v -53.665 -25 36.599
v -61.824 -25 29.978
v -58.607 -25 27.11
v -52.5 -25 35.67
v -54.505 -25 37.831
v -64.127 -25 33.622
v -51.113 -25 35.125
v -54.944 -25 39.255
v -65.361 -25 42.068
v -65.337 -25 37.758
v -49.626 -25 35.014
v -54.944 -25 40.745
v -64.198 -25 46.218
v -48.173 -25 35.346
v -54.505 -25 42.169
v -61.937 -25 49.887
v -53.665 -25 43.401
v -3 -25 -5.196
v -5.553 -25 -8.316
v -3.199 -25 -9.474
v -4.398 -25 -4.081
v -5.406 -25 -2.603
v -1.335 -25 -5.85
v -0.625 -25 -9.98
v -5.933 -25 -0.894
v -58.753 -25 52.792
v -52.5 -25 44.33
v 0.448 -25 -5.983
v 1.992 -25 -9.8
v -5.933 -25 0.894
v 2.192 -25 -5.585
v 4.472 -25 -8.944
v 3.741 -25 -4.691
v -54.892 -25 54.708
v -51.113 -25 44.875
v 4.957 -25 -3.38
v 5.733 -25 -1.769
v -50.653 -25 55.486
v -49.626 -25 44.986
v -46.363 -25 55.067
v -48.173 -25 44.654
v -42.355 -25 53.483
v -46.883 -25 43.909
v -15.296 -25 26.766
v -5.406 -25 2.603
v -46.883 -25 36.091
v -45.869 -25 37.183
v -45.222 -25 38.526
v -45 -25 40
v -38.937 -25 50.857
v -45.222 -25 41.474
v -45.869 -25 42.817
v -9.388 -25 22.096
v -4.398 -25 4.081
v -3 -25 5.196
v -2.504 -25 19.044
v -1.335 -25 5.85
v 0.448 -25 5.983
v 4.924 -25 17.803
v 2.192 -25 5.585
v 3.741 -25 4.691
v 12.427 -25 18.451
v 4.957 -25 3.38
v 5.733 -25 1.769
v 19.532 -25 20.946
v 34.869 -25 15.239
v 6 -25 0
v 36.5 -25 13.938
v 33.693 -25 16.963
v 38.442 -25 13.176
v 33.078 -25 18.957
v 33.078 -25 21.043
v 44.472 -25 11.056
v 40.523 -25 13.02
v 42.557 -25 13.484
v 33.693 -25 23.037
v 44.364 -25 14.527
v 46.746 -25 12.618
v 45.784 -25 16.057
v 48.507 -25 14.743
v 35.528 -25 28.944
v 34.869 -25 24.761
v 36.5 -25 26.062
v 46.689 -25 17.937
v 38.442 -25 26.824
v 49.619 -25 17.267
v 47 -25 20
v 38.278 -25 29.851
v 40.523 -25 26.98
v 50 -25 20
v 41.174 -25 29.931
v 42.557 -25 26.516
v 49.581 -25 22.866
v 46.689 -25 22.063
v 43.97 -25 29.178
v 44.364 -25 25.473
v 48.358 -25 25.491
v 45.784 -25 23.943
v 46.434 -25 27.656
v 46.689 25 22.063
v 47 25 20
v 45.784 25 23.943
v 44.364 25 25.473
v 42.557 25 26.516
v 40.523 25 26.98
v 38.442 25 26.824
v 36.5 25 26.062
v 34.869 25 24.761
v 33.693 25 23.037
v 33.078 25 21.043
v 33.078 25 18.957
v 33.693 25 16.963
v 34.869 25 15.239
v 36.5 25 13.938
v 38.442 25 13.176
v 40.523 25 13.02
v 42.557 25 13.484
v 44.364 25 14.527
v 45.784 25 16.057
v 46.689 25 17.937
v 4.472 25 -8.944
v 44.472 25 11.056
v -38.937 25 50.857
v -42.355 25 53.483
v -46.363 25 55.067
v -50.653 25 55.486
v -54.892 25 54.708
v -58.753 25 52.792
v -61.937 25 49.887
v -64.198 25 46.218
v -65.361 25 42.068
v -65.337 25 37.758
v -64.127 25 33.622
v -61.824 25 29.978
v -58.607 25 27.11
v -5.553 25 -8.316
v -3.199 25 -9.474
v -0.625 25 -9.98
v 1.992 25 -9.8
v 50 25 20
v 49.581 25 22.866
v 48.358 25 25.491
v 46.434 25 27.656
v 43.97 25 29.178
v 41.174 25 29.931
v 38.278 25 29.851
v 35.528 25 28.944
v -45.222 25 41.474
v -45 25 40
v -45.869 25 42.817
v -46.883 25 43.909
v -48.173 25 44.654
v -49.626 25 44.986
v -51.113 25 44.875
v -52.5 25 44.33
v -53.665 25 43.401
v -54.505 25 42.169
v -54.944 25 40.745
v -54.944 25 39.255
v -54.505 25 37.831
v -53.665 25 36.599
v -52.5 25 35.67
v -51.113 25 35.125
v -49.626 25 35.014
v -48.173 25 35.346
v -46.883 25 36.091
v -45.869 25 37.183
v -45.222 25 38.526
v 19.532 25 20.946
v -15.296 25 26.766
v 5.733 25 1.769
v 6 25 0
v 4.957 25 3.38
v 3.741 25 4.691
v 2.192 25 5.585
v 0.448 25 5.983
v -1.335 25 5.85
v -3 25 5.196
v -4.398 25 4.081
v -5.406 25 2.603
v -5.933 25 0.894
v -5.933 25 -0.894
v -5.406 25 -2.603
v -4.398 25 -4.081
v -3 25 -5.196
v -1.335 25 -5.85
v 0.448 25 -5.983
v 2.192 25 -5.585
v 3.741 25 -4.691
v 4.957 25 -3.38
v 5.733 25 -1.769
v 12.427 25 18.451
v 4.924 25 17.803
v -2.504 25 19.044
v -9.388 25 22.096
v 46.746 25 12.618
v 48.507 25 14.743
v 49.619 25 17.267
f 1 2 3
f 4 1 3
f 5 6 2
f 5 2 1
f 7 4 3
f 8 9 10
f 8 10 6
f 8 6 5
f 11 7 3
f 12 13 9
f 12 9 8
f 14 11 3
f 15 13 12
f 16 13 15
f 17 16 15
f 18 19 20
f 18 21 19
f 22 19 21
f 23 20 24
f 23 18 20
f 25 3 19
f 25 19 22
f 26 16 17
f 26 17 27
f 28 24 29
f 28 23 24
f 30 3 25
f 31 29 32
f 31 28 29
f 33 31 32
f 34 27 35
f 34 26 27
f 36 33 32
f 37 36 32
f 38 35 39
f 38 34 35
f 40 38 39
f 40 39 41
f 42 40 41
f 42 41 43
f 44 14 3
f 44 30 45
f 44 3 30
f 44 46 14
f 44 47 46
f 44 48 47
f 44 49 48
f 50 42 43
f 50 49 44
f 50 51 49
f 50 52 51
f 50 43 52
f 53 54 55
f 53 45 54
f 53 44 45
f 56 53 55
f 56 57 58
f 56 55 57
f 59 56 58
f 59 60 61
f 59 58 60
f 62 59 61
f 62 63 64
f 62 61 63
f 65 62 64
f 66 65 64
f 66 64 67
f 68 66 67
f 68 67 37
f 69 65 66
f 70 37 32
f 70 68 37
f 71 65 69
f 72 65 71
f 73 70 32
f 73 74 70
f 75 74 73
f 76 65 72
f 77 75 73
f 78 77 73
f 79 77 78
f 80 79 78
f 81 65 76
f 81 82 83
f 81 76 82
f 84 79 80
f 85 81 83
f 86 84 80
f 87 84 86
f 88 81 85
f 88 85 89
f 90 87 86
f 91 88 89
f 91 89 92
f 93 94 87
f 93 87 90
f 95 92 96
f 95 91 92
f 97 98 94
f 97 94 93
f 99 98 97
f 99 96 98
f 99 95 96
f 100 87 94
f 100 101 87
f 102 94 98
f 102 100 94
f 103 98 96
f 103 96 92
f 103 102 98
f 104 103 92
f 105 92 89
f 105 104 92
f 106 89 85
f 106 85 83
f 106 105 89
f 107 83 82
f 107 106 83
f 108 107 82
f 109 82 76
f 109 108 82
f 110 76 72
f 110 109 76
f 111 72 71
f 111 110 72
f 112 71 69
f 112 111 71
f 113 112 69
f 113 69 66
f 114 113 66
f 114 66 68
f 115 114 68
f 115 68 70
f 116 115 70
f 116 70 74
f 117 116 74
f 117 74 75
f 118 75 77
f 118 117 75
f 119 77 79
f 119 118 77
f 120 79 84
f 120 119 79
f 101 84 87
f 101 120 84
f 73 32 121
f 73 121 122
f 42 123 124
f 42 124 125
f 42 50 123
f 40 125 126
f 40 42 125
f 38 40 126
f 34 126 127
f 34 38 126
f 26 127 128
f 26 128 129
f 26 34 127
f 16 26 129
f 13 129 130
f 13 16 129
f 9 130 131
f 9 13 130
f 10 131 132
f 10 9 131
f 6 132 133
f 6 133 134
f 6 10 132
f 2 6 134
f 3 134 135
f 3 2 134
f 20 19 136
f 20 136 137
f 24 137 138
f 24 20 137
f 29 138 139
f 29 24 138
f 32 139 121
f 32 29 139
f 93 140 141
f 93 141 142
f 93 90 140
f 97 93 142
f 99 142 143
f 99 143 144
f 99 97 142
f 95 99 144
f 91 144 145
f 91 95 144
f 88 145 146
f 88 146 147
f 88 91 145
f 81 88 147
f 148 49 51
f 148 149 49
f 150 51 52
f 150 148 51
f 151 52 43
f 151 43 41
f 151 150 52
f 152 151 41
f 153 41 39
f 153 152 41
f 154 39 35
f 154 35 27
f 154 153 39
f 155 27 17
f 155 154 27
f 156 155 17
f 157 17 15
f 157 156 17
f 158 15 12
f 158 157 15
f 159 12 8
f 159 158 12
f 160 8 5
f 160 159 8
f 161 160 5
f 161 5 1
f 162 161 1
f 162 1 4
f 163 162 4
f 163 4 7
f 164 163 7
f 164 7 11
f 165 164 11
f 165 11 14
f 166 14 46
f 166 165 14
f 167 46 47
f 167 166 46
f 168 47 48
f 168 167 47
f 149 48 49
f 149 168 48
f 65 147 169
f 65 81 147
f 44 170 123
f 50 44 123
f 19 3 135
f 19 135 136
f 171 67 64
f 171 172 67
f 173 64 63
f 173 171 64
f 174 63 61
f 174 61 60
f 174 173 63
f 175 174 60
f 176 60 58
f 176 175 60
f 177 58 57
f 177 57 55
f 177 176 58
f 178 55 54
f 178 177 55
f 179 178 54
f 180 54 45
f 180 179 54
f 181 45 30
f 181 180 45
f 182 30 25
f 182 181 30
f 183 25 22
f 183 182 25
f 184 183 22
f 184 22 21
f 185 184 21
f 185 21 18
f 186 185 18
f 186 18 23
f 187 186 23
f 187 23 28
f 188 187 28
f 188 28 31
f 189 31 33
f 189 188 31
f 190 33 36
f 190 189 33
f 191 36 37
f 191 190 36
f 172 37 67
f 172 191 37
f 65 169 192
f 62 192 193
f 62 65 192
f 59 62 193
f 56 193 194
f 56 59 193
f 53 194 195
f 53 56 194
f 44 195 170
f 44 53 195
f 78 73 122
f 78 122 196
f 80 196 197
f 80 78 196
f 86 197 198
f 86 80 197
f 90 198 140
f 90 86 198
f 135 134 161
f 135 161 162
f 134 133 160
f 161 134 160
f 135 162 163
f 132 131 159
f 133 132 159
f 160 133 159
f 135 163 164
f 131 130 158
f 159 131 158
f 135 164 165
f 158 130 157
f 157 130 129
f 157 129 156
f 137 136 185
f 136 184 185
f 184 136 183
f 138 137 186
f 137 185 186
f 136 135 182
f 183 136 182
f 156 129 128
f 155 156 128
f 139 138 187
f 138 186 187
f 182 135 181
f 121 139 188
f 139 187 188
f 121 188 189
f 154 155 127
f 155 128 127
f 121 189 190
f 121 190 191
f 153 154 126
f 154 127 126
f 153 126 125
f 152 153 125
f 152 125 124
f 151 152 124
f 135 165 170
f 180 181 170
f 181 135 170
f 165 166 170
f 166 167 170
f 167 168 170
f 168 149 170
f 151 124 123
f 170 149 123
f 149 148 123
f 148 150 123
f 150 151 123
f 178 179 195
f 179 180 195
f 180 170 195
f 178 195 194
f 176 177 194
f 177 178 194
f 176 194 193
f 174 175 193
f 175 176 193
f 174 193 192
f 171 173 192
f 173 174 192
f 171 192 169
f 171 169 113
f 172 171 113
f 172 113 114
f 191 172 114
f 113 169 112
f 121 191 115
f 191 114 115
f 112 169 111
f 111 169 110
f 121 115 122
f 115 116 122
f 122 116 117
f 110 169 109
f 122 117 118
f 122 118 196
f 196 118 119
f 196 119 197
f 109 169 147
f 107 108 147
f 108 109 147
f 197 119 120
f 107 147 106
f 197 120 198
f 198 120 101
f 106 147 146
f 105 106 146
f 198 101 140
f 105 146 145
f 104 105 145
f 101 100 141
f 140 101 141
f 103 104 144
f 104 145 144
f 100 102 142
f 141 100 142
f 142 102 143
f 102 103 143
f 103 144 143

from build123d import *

# Parameters (mm, degrees)
F0_R     = 5
F0_R_2   = 6
F0_R_3   = 7
F1_DEPTH = 25


with BuildPart() as f1:
    # F0 (on Front) → F1 (new body, symmetric)
    with BuildSketch(Plane.XZ):
        with BuildLine():
            ThreePointArc((-38.937303, 50.856645), (-61.936842, 49.887456), (-58.607353, 27.109559))
            ThreePointArc((-58.607353, 27.109559), (-42.691237, 26.33135), (-34.5, 40))
            ThreePointArc((-34.5, 40), (-35.652147, 45.864222), (-38.937303, 50.856645))
        make_face()
        with Locations((-50, 40)):
            Circle(F0_R, mode=Mode.SUBTRACT)
        with BuildLine():
            ThreePointArc((-5.553131, -8.316414), (-4.715331, 8.818484), (10, 0))
            ThreePointArc((10, 0), (8.506508, -5.257311), (4.472136, -8.944272))
            Line((4.472136, -8.944272), (44.472136, 11.055728))
            ThreePointArc((44.472136, 11.055728), (31.055728, 15.527864), (35.527864, 28.944272))
            Line((35.527864, 28.944272), (19.532285, 20.946482))
            ThreePointArc((19.532285, 20.946482), (1.171282, 18.189588), (-15.295793, 26.766436))
            Line((-15.295793, 26.766436), (-38.937303, 50.856645))
            ThreePointArc((-38.937303, 50.856645), (-35.652147, 45.864222), (-34.5, 40))
            ThreePointArc((-34.5, 40), (-42.691237, 26.33135), (-58.607353, 27.109559))
            Line((-58.607353, 27.109559), (-5.553131, -8.316414))
        make_face()
        with BuildLine():
            ThreePointArc((4.472136, -8.944272), (8.506508, -5.257311), (10, 0))
            ThreePointArc((10, 0), (-4.715331, 8.818484), (-5.553131, -8.316414))
            ThreePointArc((-5.553131, -8.316414), (-0.625051, -9.980446), (4.472136, -8.944272))
        make_face()
        Circle(F0_R_2, mode=Mode.SUBTRACT)
        with BuildLine():
            ThreePointArc((35.527864, 28.944272), (31.055728, 15.527864), (44.472136, 11.055728))
            ThreePointArc((44.472136, 11.055728), (48.506508, 14.742689), (50, 20))
            ThreePointArc((50, 20), (45.257311, 28.506508), (35.527864, 28.944272))
        make_face()
        with Locations((40, 20)):
            Circle(F0_R_3, mode=Mode.SUBTRACT)
    extrude(amount=F1_DEPTH, both=True)


solid = f1.part
